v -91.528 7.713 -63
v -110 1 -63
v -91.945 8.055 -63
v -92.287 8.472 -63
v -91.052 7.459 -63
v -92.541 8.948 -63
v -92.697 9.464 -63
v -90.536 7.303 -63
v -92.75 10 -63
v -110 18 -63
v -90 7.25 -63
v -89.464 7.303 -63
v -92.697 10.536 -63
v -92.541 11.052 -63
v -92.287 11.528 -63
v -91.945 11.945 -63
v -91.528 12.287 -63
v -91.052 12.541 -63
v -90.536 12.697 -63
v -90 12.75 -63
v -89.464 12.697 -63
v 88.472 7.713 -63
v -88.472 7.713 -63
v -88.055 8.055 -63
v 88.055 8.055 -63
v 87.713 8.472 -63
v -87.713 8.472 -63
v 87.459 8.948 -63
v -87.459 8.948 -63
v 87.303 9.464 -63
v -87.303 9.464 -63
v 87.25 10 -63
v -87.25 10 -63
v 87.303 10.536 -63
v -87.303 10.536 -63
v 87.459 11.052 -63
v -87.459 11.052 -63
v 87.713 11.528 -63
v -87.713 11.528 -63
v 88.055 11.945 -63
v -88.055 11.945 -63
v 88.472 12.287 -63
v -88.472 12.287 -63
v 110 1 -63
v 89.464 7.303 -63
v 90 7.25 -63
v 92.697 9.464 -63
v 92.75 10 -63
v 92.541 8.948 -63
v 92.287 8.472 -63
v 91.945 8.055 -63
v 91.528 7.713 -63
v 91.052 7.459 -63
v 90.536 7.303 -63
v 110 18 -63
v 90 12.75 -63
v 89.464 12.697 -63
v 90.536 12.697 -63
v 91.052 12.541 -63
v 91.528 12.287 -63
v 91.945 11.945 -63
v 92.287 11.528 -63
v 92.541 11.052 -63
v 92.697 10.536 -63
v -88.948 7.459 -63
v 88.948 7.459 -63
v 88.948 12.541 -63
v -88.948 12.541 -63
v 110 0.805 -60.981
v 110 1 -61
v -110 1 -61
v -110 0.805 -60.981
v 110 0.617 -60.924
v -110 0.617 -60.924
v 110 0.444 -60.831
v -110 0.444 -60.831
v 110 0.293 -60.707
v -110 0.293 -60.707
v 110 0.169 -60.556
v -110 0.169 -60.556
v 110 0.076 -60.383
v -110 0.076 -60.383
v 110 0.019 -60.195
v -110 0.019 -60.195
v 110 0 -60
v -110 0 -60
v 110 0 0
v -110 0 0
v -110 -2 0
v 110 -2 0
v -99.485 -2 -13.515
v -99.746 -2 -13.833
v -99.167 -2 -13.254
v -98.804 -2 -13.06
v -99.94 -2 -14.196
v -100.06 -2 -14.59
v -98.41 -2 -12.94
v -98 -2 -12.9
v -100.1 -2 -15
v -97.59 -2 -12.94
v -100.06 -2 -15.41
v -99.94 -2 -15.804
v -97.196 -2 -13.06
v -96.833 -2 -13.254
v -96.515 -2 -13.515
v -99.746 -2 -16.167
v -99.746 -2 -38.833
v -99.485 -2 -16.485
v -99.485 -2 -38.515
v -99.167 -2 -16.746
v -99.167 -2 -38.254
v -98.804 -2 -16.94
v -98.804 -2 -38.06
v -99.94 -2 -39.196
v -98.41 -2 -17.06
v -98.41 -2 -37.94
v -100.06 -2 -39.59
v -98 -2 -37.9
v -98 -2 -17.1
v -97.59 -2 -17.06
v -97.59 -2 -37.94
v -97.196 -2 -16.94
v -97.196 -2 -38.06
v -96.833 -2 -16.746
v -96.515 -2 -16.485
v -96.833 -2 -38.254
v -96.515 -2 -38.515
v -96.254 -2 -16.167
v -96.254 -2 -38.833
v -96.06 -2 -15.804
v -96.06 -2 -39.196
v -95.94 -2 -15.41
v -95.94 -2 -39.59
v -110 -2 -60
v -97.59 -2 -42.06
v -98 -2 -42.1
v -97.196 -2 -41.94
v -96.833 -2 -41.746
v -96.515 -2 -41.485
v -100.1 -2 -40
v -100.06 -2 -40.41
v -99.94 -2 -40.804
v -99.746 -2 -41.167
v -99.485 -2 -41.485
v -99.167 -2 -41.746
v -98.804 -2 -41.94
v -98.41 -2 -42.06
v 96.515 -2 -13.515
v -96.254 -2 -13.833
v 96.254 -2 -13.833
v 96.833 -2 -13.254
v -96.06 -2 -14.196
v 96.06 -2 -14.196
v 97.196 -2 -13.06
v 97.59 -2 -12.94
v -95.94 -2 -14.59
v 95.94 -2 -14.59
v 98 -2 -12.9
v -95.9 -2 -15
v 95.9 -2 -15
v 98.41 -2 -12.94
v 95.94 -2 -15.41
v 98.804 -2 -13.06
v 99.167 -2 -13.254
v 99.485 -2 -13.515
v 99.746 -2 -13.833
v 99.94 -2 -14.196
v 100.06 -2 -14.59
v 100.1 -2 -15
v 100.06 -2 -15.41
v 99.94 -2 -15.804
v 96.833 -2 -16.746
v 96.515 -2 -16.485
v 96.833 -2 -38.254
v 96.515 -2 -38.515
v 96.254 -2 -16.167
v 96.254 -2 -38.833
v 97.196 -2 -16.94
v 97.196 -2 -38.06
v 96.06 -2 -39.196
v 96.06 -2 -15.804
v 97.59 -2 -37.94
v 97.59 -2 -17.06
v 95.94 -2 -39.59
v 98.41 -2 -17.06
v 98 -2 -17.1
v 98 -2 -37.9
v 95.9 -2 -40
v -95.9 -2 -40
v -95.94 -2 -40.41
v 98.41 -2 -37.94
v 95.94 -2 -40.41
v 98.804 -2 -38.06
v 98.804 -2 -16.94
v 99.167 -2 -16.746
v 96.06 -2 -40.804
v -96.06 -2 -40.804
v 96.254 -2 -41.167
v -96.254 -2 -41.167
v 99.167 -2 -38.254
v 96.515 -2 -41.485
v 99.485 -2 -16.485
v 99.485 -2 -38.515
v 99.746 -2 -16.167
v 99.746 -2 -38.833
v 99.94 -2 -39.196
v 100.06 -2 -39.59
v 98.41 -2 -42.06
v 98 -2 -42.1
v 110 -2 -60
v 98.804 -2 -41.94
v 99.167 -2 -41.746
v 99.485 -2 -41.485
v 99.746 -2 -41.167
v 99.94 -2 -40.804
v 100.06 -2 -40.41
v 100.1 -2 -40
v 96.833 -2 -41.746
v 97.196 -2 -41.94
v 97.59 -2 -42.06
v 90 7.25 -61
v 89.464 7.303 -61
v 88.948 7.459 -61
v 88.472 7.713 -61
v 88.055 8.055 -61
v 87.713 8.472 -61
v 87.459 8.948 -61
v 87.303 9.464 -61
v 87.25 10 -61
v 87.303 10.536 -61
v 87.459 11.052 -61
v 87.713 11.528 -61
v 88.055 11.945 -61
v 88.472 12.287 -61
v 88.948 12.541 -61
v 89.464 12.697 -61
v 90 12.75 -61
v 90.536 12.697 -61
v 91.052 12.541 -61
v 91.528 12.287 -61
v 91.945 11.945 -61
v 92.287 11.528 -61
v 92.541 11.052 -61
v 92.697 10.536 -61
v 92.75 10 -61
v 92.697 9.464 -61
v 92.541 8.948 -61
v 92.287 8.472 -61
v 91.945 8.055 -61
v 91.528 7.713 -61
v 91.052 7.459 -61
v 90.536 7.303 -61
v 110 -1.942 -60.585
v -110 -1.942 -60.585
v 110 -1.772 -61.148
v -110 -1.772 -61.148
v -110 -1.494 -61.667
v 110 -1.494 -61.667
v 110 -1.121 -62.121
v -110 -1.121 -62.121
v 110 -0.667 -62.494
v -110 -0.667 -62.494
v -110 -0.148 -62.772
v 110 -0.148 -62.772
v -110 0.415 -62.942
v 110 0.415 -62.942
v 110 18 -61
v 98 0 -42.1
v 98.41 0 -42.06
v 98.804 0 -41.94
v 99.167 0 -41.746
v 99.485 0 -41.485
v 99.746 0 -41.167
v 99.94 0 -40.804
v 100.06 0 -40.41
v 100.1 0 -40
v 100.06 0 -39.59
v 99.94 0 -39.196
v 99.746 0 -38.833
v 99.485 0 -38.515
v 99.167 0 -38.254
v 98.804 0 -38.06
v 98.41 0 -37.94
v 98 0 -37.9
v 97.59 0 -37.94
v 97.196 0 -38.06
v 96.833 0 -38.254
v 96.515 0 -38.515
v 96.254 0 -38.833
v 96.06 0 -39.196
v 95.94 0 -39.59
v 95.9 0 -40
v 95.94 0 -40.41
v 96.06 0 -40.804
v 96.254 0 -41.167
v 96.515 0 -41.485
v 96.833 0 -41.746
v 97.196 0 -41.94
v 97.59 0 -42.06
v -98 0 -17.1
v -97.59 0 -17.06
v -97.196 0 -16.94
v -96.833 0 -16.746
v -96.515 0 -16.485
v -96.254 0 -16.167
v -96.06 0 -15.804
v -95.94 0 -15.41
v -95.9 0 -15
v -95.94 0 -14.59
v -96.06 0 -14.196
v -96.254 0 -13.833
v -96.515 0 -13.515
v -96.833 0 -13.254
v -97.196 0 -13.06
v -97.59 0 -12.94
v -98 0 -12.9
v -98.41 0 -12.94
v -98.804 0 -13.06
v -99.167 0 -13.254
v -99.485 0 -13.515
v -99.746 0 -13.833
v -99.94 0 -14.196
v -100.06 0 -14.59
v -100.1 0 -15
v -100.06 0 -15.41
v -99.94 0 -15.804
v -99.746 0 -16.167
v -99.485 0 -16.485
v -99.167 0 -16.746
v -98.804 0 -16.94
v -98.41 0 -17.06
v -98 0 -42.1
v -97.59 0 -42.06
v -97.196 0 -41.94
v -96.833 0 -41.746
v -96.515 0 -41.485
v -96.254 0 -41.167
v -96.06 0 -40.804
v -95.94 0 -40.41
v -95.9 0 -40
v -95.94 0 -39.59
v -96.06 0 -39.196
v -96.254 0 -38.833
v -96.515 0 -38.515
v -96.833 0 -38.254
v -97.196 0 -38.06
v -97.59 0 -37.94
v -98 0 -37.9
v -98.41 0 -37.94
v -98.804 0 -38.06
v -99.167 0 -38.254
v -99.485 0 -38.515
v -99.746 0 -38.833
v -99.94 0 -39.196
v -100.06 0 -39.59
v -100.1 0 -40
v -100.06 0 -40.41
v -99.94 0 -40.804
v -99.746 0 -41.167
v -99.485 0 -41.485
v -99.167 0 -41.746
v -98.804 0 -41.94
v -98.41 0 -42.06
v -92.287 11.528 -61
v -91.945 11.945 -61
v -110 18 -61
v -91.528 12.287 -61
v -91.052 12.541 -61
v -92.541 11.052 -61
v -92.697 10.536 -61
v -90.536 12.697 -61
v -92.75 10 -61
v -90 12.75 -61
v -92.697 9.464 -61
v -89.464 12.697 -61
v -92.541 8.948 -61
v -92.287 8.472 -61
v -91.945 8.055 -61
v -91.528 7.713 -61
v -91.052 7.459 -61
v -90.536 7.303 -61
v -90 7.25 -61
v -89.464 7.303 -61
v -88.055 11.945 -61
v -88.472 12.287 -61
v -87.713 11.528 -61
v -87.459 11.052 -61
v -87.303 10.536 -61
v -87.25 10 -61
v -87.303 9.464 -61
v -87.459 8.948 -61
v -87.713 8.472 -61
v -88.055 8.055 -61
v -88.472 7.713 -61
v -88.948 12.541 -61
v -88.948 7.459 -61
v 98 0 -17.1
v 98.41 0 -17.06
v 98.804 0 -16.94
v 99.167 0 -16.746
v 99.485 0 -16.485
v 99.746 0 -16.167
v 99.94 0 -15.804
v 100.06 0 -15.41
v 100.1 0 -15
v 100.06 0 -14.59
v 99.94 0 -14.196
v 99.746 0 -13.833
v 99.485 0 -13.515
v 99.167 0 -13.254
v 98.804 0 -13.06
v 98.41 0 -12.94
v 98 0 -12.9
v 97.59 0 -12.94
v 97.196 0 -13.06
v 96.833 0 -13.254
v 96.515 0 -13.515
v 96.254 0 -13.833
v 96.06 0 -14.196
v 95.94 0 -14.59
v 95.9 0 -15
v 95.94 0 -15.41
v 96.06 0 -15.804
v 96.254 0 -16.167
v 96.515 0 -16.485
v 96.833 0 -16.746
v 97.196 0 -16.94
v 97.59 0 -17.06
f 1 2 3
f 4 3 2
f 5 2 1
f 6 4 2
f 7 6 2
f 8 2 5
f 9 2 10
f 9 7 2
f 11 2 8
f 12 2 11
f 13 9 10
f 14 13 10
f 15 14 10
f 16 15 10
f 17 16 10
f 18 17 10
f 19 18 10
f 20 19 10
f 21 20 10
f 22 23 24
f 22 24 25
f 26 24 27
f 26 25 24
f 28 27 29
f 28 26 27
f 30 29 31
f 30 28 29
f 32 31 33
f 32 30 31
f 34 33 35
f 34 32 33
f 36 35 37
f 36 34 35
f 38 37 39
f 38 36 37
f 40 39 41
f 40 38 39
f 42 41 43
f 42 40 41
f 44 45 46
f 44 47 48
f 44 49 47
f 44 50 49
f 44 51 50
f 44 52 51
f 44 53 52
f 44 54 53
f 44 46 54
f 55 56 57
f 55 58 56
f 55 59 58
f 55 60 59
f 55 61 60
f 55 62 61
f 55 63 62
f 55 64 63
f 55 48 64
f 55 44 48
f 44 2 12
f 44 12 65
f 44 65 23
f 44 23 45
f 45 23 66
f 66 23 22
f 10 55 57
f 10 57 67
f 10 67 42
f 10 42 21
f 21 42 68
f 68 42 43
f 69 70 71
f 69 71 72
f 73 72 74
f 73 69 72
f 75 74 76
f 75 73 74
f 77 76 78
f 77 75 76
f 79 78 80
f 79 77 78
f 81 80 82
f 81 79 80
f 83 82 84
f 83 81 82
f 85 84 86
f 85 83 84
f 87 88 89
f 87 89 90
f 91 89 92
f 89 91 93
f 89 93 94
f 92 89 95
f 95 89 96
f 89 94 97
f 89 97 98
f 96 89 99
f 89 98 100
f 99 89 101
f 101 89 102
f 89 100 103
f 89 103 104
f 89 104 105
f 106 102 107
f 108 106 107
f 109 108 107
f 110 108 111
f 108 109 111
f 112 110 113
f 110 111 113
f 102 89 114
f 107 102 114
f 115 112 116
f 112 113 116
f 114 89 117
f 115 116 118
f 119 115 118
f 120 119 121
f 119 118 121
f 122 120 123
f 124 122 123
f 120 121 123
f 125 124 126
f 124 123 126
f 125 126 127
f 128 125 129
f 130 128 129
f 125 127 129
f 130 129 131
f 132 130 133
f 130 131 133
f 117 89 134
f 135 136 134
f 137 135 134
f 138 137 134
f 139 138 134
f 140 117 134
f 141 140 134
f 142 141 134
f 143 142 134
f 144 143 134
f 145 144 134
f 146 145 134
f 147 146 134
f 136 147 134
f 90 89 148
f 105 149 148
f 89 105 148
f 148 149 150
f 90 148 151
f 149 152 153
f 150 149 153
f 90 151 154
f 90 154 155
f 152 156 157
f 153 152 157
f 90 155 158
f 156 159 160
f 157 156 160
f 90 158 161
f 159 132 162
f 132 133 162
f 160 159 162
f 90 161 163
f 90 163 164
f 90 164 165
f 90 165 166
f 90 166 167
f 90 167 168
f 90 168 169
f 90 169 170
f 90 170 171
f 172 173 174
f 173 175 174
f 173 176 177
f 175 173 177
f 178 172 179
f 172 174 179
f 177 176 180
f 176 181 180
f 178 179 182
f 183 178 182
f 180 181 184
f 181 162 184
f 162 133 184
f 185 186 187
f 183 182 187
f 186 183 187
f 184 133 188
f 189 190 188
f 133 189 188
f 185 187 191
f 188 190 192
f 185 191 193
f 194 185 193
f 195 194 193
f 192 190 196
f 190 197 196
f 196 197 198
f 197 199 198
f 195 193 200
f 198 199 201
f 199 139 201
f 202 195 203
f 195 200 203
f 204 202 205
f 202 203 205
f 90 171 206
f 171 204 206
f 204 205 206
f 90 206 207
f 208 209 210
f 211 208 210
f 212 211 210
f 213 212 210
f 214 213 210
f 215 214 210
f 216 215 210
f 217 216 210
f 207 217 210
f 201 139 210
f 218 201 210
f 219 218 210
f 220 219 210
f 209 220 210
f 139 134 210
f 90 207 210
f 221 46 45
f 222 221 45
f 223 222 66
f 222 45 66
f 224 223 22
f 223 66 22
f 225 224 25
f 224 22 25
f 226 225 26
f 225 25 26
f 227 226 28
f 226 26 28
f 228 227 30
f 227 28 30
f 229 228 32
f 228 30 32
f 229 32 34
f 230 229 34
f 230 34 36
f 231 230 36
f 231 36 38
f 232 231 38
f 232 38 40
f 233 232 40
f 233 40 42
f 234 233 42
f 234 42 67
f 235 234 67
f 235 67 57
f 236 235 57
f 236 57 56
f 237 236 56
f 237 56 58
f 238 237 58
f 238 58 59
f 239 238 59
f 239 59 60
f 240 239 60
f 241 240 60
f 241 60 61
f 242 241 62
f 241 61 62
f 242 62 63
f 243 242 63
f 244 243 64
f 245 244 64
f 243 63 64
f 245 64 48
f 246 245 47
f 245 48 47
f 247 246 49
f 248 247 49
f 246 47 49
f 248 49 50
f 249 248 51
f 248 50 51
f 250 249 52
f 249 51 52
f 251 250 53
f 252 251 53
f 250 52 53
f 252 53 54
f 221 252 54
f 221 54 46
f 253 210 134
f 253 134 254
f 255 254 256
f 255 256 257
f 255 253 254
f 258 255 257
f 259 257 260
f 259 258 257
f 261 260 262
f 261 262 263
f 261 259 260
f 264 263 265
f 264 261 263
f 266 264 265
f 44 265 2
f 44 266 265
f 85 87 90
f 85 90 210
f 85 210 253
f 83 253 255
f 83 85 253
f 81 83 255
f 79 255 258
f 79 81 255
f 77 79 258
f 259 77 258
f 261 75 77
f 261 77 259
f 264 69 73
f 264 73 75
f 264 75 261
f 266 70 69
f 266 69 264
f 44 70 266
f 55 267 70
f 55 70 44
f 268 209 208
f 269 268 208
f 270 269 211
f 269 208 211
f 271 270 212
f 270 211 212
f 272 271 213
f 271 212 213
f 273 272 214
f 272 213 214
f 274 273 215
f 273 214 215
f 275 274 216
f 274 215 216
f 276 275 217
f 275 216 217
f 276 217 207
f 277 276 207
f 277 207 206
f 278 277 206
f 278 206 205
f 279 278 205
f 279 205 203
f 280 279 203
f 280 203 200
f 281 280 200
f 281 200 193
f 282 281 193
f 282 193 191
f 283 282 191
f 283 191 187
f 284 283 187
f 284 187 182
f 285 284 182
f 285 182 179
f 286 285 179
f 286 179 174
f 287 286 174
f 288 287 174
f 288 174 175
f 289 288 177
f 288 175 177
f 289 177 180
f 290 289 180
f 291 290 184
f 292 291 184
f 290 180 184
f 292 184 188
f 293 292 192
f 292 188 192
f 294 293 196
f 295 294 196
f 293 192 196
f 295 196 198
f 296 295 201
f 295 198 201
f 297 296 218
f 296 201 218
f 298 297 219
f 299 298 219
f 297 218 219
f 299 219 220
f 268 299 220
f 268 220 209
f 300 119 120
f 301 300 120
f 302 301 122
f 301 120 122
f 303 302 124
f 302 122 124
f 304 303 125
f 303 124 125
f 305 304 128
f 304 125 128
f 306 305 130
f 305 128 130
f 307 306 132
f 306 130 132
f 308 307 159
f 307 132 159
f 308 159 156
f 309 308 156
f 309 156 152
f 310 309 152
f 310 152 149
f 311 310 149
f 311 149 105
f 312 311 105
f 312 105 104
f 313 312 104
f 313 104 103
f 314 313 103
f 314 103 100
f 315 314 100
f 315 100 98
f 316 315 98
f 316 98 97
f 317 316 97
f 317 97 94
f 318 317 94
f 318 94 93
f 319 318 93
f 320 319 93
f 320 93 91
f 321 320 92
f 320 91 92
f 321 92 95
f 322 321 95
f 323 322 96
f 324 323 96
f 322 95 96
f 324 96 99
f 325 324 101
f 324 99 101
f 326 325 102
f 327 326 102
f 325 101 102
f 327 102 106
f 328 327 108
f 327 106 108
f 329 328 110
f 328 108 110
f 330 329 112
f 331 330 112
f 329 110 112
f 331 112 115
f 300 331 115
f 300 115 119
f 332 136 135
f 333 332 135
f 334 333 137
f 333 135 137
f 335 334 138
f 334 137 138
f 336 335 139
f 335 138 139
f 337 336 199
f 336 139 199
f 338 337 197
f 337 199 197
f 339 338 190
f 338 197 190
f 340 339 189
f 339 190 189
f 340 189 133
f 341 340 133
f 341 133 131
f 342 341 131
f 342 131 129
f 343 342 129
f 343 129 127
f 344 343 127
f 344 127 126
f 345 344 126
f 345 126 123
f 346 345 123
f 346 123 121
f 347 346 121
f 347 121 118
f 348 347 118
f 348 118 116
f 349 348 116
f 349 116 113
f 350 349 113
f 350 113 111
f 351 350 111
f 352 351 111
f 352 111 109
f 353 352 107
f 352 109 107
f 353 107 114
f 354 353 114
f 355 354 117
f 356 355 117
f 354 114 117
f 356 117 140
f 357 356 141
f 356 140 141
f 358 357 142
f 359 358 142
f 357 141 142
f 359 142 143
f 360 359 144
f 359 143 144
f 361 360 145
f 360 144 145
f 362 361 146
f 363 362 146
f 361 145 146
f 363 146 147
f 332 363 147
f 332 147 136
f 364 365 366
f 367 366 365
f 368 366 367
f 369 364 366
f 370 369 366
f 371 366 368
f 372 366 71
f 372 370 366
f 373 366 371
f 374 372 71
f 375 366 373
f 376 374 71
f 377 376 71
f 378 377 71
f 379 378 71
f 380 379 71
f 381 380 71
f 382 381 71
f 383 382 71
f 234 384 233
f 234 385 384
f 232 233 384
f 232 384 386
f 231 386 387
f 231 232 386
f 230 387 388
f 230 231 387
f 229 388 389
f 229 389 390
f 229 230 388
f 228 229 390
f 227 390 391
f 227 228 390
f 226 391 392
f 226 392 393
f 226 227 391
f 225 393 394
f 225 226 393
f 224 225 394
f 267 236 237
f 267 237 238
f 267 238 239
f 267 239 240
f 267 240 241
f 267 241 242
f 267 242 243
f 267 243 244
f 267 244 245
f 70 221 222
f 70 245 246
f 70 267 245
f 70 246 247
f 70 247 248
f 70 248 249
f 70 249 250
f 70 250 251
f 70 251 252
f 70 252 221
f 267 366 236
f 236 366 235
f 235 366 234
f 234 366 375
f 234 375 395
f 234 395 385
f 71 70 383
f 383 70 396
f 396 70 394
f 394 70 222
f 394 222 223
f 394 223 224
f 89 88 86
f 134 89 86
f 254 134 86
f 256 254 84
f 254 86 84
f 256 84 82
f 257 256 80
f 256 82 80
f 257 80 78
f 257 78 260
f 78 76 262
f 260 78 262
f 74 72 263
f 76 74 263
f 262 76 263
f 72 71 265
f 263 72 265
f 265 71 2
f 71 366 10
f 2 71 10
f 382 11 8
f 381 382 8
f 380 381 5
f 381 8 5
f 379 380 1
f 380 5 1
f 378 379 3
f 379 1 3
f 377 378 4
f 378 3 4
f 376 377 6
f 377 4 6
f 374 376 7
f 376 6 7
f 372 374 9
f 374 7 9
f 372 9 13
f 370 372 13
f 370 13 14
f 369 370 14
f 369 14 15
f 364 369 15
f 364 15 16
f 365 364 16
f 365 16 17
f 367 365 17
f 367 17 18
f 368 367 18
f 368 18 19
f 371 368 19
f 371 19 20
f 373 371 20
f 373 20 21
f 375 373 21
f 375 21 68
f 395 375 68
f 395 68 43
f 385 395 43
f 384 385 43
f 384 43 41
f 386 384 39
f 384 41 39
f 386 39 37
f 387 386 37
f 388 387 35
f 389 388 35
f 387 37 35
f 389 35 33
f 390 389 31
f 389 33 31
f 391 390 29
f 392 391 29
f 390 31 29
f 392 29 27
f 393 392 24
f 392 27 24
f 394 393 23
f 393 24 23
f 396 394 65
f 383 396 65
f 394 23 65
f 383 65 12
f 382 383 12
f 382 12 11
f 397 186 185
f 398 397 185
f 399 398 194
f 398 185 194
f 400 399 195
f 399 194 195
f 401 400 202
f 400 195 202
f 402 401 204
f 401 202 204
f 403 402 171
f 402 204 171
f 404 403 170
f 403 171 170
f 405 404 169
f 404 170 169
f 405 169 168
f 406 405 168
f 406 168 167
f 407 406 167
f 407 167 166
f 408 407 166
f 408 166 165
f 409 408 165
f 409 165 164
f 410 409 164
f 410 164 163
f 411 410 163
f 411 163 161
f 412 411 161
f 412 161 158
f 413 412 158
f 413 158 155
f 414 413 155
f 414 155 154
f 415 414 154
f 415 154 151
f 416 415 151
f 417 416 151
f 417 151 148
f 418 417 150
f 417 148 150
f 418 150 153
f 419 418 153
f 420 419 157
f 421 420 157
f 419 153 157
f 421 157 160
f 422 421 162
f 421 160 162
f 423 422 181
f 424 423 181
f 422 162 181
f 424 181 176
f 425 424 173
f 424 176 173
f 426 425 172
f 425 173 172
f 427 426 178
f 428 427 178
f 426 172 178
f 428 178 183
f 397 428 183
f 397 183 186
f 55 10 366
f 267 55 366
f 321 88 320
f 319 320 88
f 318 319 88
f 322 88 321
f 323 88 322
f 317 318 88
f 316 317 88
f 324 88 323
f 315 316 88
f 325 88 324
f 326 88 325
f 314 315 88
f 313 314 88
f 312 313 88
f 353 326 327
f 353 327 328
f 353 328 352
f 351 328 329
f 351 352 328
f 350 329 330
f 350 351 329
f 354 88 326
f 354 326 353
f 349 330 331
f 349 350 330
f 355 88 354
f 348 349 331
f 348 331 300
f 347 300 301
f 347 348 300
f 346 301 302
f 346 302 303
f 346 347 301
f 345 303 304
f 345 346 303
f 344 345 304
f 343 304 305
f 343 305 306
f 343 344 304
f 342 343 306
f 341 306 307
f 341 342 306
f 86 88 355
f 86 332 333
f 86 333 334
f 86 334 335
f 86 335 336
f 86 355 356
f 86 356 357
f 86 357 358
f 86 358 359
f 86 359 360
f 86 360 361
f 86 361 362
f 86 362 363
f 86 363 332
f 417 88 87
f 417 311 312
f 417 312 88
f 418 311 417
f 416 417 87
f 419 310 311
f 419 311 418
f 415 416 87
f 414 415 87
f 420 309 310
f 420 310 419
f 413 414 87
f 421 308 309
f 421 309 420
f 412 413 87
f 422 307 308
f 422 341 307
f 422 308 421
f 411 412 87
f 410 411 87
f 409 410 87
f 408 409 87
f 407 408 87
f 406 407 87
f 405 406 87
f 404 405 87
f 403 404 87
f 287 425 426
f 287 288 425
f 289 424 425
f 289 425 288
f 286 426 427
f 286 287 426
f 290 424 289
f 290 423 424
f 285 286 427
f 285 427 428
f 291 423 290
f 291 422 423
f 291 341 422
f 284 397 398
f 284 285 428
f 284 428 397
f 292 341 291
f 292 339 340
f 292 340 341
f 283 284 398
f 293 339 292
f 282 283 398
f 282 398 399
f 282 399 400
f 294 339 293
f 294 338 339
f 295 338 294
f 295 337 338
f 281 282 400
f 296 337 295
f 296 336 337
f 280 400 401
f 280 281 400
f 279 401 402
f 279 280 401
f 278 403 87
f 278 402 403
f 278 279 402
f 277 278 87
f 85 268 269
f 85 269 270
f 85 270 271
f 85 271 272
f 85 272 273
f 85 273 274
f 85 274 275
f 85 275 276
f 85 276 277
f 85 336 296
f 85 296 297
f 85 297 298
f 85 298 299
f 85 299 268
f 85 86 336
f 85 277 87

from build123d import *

# Parameters (mm, degrees)
SKETCH_1_W             = 220
SKETCH_1_H             = 60
SM_BASE_FLANGE_1_DEPTH = 2
SM_EDGE_FLANGE_1_DEPTH = 220
MM_1_D                 = 5.5
MM_1_DEPTH             = 8
MM_1_TIP               = 1.652366702
HOLE_WIZARD_M5_1_D     = 4.2
HOLE_WIZARD_M5_1_DEPTH = 12.4
HOLE_WIZARD_M5_1_TIP   = 1.2618073


# Sheet-metal steps are written as plain solids
with BuildPart() as part:
    # Sketch 1 → 基体-法兰1 (new body)
    with BuildSketch(Plane(origin=(0, 0, 0), x_dir=(1, 0, 0), z_dir=(0, 1, 0))):
        with Locations((0, 30)):
            Rectangle(SKETCH_1_W, SKETCH_1_H)
    extrude(amount=-SM_BASE_FLANGE_1_DEPTH)

    # 边线-法兰1 section (across the edge) → 边线-法兰1 (add)
    with BuildSketch(Plane(origin=(110, 0, -61), x_dir=(0, 0, 1), z_dir=(-1, 0, 0))):
        with BuildLine():
            Line((-2, 1), (-2, 18))
            Line((-2, 18), (0, 18))
            Line((0, 18), (0, 1))
            ThreePointArc((0, 1), (0.292893219, 0.292893219), (1, 0))
            Line((1, 0), (1, -2))
            ThreePointArc((1, -2), (-1.121320344, -1.121320344), (-2, 1))
        make_face()
    extrude(amount=SM_EDGE_FLANGE_1_DEPTH)

    # 大小mm 暗销孔1
    with Locations(Plane(origin=(90, 10, -61), x_dir=(0, 1, 0), z_dir=(0, 0, 1))):
        with Locations((0, 0), (0, 180)):
            Hole(MM_1_D / 2, depth=MM_1_DEPTH)
            with Locations((0, 0, -(MM_1_DEPTH + MM_1_TIP / 2))):  # 118° drill point
                Cone(0, MM_1_D / 2, MM_1_TIP, mode=Mode.SUBTRACT)

    # M5 螺纹孔1
    with Locations(Plane(origin=(98, 0, -40), x_dir=(0, 0, 1), z_dir=(0, 1, 0))):
        with Locations((0, 0), (25, 0), (0, -196), (25, -196)):
            Hole(HOLE_WIZARD_M5_1_D / 2, depth=HOLE_WIZARD_M5_1_DEPTH)
            with Locations((0, 0, -(HOLE_WIZARD_M5_1_DEPTH + HOLE_WIZARD_M5_1_TIP / 2))):  # 118° drill point
                Cone(0, HOLE_WIZARD_M5_1_D / 2, HOLE_WIZARD_M5_1_TIP, mode=Mode.SUBTRACT)


solid = part.part
